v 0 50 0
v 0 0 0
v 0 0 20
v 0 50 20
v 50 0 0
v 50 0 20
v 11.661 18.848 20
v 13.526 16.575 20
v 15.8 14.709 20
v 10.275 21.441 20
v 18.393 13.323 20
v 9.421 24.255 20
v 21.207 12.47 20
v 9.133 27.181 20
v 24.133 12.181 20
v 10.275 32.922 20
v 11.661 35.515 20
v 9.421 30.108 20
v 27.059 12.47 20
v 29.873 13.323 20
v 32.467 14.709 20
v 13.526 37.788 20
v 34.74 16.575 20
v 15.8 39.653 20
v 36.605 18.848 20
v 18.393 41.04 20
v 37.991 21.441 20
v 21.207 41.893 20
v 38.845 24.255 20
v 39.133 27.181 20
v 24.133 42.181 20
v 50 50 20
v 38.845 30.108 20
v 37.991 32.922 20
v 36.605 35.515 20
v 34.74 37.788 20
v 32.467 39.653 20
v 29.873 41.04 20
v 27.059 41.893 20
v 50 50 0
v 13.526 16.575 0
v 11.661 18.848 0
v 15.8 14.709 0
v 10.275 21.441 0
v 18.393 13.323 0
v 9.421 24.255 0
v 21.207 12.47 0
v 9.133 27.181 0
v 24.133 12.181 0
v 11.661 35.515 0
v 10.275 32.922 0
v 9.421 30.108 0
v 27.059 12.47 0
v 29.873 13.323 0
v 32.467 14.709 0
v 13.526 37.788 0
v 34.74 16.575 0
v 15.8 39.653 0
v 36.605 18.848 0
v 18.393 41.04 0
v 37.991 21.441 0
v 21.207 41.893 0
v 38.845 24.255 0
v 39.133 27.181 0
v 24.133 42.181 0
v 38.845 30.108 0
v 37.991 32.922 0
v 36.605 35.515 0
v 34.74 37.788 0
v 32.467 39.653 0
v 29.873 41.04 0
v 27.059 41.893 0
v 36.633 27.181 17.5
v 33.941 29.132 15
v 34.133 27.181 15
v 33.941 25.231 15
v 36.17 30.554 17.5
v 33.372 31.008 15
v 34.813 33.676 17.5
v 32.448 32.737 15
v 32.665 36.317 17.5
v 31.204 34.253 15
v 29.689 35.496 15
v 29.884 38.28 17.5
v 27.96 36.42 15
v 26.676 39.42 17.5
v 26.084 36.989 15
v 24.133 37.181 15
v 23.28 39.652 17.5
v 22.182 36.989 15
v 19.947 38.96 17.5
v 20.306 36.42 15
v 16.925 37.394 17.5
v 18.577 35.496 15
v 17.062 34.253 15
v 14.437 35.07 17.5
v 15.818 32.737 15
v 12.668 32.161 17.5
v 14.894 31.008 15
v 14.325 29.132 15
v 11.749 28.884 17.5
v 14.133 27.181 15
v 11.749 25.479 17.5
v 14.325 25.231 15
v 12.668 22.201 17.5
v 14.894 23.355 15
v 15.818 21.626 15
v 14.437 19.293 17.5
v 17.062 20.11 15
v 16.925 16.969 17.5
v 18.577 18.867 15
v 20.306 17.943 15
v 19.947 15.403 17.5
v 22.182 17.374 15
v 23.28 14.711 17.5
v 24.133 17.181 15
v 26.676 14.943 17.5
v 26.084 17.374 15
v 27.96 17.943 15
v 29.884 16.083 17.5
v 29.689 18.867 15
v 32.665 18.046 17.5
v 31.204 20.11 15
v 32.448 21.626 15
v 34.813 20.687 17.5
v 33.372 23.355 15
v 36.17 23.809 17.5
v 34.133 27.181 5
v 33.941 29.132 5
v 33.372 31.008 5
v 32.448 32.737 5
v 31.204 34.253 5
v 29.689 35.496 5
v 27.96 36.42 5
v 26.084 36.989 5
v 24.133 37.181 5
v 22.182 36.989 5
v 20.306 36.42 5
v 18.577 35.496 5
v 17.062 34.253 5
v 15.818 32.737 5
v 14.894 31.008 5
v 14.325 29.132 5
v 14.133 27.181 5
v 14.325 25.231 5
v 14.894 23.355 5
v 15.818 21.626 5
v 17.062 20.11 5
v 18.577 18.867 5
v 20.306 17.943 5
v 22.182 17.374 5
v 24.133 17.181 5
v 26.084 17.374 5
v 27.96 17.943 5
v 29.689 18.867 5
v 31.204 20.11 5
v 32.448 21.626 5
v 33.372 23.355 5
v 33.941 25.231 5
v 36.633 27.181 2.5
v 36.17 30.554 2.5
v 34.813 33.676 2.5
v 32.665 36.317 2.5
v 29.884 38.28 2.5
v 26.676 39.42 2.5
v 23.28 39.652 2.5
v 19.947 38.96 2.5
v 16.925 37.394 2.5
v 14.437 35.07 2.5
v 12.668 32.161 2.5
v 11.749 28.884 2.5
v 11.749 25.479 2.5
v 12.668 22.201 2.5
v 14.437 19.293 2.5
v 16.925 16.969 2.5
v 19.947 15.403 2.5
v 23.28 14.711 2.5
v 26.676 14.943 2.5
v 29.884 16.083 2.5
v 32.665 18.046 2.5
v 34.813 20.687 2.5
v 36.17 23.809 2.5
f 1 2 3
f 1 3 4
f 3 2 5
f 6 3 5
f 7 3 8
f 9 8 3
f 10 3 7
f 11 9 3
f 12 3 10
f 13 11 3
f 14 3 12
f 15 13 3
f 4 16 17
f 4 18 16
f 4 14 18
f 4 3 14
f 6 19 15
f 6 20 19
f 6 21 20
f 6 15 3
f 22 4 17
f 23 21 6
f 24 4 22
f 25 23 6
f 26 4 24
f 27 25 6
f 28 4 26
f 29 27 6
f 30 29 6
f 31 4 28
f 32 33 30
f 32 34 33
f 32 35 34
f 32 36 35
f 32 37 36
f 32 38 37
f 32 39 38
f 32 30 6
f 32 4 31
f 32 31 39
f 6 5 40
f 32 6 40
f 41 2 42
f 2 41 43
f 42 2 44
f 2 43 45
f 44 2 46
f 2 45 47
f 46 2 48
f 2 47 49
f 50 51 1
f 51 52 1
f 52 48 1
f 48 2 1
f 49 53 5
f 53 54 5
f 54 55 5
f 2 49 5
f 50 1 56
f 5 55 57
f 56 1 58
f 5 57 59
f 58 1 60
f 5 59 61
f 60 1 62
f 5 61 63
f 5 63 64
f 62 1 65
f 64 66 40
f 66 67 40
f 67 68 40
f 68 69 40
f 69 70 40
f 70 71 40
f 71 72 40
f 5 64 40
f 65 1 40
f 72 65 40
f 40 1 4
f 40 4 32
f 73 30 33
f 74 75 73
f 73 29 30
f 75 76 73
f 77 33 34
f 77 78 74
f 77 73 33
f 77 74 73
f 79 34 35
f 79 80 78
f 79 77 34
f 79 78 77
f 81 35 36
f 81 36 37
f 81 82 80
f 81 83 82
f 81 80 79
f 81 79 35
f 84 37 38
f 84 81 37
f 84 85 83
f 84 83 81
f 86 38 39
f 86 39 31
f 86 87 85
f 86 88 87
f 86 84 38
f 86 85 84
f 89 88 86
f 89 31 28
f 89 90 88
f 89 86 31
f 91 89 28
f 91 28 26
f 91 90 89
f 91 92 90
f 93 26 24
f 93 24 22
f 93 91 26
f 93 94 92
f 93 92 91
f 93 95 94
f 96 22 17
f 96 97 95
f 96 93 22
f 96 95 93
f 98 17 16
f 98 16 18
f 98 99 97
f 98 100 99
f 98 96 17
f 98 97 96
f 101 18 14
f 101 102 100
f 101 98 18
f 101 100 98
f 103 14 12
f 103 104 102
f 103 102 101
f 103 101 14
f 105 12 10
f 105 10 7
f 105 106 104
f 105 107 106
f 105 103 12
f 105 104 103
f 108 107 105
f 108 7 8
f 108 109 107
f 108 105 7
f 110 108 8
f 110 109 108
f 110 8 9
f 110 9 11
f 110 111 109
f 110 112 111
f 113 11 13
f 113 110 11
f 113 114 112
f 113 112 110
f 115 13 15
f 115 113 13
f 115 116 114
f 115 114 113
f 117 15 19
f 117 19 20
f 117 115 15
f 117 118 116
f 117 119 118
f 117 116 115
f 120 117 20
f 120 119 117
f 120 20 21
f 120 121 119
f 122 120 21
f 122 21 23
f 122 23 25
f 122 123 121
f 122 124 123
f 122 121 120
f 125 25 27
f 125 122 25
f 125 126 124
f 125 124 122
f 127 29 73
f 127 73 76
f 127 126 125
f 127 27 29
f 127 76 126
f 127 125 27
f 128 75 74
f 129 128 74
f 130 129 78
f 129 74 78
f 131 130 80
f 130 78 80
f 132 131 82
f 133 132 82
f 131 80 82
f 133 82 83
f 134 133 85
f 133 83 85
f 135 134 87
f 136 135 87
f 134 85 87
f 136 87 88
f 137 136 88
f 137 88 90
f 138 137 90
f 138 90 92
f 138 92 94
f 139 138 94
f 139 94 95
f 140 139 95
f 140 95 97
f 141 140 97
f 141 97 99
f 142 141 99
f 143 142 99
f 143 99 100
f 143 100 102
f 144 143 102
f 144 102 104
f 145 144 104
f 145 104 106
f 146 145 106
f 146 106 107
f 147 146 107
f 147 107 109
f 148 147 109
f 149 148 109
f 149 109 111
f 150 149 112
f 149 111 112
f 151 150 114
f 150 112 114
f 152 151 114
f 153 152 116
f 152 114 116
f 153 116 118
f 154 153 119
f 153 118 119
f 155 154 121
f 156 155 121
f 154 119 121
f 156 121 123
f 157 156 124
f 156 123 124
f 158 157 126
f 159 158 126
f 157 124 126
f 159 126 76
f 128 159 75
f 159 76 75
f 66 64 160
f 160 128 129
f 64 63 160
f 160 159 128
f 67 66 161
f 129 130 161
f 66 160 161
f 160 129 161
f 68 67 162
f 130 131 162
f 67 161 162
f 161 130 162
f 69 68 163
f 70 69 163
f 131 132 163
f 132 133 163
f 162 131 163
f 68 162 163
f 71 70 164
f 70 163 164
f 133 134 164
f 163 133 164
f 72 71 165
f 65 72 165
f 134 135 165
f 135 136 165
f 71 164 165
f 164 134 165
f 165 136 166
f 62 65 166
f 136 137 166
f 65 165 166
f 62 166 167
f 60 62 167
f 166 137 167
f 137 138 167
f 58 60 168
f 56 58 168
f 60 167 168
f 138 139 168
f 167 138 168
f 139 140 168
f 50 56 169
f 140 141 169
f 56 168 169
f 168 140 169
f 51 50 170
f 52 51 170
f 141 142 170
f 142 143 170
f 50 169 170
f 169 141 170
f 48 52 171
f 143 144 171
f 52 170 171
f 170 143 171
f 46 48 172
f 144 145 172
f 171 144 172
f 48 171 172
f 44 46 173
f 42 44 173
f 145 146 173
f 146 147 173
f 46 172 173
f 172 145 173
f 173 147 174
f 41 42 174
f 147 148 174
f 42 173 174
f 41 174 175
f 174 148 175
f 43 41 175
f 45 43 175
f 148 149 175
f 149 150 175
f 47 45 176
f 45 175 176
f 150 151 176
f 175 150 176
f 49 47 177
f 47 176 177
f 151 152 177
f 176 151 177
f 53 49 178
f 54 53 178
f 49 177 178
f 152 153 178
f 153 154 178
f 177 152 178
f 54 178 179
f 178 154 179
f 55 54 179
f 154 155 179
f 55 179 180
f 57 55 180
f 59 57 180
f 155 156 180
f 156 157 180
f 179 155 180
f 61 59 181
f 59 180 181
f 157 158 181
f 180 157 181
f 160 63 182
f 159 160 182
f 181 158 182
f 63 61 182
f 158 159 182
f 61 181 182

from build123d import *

# Parameters (mm, degrees)
F0_W     = 50
F0_H     = 50
F1_DEPTH = 20
F2_R     = 10
F3_DEPTH = 25
F4_SIZE  = 5


with BuildPart() as f1:
    # F0 (on Top) → F1 (new body)
    with BuildSketch(Plane.XY):
        with Locations((25, 25)):
            Rectangle(F0_W, F0_H)
    extrude(amount=F1_DEPTH)

    # F2 (on face) → F3 (cut)
    with BuildSketch(Plane.XY.offset(20)):
        with Locations((24.133066, 27.181452)):
            Circle(F2_R)
    extrude(amount=-F3_DEPTH, mode=Mode.SUBTRACT)

    # F4
    f4_edges = [f1.edges().sort_by_distance(p)[0] for p in [
        (14.133066, 27.181452, 20),
        (14.133066, 27.181452, 0),
    ]]
    chamfer(f4_edges, length=F4_SIZE)


solid = f1.part
